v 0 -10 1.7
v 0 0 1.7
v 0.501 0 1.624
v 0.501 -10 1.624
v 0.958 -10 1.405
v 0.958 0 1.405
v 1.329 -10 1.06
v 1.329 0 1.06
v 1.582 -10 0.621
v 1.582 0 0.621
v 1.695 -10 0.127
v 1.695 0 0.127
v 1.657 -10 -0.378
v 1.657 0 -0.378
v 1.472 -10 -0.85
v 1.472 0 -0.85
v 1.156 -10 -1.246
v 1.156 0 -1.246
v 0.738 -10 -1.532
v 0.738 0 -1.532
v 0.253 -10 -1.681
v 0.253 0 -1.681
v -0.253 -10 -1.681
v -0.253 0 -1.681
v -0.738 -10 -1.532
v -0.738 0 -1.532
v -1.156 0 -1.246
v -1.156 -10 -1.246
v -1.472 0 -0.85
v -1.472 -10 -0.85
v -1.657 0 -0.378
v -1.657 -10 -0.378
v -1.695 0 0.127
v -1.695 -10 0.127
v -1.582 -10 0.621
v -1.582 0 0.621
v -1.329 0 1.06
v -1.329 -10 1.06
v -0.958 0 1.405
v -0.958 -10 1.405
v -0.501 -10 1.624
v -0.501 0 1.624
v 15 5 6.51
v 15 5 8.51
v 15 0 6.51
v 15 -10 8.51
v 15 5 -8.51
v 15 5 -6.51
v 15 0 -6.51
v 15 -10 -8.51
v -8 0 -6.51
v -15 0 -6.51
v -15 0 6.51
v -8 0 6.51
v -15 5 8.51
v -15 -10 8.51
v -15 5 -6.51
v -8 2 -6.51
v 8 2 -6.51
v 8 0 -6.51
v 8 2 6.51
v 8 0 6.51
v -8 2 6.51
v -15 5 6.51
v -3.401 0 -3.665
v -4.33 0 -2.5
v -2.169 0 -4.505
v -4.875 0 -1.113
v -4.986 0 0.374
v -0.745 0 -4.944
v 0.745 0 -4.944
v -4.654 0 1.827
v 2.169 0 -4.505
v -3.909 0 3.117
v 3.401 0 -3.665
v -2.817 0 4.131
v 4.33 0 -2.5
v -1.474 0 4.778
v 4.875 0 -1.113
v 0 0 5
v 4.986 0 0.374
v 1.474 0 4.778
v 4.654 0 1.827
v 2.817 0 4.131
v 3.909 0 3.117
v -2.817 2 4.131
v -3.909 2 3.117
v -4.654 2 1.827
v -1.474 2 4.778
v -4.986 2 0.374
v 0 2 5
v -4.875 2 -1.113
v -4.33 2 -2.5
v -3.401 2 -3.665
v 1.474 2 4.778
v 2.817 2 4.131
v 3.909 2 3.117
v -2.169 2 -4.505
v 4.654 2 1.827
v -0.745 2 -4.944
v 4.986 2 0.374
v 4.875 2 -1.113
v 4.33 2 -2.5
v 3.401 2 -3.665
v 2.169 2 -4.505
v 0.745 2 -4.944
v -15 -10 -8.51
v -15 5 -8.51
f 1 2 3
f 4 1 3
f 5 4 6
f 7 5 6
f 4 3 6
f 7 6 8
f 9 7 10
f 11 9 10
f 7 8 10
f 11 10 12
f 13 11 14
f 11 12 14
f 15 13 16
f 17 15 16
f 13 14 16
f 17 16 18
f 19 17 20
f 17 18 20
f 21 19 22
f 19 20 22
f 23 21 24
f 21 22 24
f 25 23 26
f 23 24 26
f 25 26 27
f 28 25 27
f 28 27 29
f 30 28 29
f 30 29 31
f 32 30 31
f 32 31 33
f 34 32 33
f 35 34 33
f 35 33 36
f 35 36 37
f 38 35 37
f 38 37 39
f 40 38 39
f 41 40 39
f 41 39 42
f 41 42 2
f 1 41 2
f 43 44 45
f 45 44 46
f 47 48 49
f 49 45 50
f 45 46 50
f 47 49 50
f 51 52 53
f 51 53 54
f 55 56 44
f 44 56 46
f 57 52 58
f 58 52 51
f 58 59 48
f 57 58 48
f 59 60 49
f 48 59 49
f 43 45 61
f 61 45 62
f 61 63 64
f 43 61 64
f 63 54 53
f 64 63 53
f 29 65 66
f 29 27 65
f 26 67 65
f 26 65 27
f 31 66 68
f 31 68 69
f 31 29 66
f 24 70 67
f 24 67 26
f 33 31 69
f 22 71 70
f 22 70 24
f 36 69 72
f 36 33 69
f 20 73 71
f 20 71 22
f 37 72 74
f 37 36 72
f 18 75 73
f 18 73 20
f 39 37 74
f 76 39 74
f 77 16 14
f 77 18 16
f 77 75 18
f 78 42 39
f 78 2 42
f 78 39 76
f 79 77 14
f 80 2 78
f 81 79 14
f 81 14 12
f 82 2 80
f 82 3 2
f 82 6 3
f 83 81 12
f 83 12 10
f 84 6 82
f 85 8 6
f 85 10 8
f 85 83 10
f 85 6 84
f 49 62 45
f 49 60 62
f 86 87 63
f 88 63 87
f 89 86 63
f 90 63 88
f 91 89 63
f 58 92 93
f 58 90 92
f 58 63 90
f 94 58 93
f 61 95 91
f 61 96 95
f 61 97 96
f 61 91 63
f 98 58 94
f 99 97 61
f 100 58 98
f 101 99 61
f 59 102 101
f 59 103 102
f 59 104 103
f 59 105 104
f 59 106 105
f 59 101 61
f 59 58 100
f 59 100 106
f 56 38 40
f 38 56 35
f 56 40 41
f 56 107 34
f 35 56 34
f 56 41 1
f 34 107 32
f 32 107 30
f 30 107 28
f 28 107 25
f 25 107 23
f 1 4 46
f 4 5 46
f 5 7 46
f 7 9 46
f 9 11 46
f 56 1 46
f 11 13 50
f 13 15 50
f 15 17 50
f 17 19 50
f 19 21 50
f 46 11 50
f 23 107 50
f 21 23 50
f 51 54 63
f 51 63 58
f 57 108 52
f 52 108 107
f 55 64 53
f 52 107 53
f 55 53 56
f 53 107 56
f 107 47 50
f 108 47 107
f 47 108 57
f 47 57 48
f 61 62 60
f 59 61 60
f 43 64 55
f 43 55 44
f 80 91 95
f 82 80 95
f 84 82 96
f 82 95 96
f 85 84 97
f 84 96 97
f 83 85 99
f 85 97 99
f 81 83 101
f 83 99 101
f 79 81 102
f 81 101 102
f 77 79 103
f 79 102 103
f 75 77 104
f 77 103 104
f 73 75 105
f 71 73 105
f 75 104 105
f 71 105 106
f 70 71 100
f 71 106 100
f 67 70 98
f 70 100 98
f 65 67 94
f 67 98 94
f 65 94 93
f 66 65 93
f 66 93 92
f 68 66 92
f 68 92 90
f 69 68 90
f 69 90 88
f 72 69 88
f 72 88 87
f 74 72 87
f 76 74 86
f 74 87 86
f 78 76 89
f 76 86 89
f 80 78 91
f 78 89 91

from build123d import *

# Parameters (mm, degrees)
SKETCH1_W           = 16
SKETCH1_H           = 13.02
SKETCH1_W_2         = 7
BOSS_EXTRUDE1_DEPTH = 10
SKETCH1_3_W         = 16
SKETCH1_3_H         = 13.02
BOSS_EXTRUDE2_DEPTH = 2
BOSS_EXTRUDE3_DEPTH = 5
SKETCH2_R           = 1.7
CUT_EXTRUDE1_DEPTH  = 22.01
SKETCH2_3_R         = 5
SKETCH2_3_R_2       = 1.7
CUT_EXTRUDE2_DEPTH  = 2


with BuildPart() as part:
    # Sketch1 → Boss-Extrude1 (new body)
    with BuildSketch(Plane(origin=(0, 0, 0), x_dir=(1, 0, 0), z_dir=(0, 1, 0))):
        Polygon((-15, -6.51), (-15, -8.51), (15, -8.51), (15, -6.51), (8, -6.51), (-8, -6.51), align=None)
        Rectangle(SKETCH1_W, SKETCH1_H)
        Polygon((-15, 8.51), (-15, 6.51), (-8, 6.51), (8, 6.51), (15, 6.51), (15, 8.51), align=None)
        with Locations((11.5, 0)):
            Rectangle(SKETCH1_W_2, SKETCH1_H)
        with Locations((-11.5, 0)):
            Rectangle(SKETCH1_W_2, SKETCH1_H)
    extrude(amount=-BOSS_EXTRUDE1_DEPTH)

    # Sketch1<3> → Boss-Extrude2 (add)
    with BuildSketch(Plane(origin=(0, 0, 0), x_dir=(1, 0, 0), z_dir=(0, 1, 0))):
        Rectangle(SKETCH1_3_W, SKETCH1_3_H)
    extrude(amount=BOSS_EXTRUDE2_DEPTH)

    # Sketch1<4> → Boss-Extrude3 (add)
    with BuildSketch(Plane(origin=(0, 0, 0), x_dir=(1, 0, 0), z_dir=(0, 1, 0))):
        Polygon((-15, -6.51), (-15, -8.51), (15, -8.51), (15, -6.51), (8, -6.51), (-8, -6.51), align=None)
        Polygon((-15, 8.51), (-15, 6.51), (-8, 6.51), (8, 6.51), (15, 6.51), (15, 8.51), align=None)
    extrude(amount=BOSS_EXTRUDE3_DEPTH)

    # Sketch2 → Cut-Extrude1 (cut, through all)
    with BuildSketch(Plane(origin=(0, 2, 0), x_dir=(1, 0, 0), z_dir=(0, 1, 0))):
        with Locations(Location((0, 0, 0), (0, 0, 270))):
            Circle(SKETCH2_R)
    extrude(amount=-CUT_EXTRUDE1_DEPTH, mode=Mode.SUBTRACT)

    # Sketch2<3> → Cut-Extrude2 (cut)
    with BuildSketch(Plane(origin=(0, 2, 0), x_dir=(1, 0, 0), z_dir=(0, 1, 0))):
        with Locations(Location((0, 0, 0), (0, 0, 270))):
            Circle(SKETCH2_3_R)
        with Locations(Location((0, 0, 0), (0, 0, 270))):
            Circle(SKETCH2_3_R_2, mode=Mode.SUBTRACT)
    extrude(amount=-CUT_EXTRUDE2_DEPTH, mode=Mode.SUBTRACT)


solid = part.part
